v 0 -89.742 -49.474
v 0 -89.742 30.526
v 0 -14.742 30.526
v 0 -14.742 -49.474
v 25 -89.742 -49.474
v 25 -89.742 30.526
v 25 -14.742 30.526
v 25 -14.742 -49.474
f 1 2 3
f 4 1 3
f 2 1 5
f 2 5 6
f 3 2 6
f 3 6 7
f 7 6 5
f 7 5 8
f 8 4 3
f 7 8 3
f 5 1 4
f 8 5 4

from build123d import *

# Parameters (mm, degrees)
F0_W     = 75
F0_H     = 80
F1_DEPTH = 25
F2_DEPTH = 25
F3_DEPTH = 25


with BuildPart() as f1:
    # F0 (on Right) → F1 (new body)
    with BuildSketch(Plane.YZ):
        with Locations((-52.241983, -9.474061)):
            Rectangle(F0_W, F0_H)
    extrude(amount=F1_DEPTH)

    # F0 (on Right) → F2 (join)
    with BuildSketch(Plane.YZ):
        with Locations((-52.241983, -9.474061)):
            Rectangle(F0_W, F0_H)
    extrude(amount=F2_DEPTH)

    # F0 (on Right) → F3 (join)
    with BuildSketch(Plane.YZ):
        with Locations((-52.241983, -9.474061)):
            Rectangle(F0_W, F0_H)
    extrude(amount=F3_DEPTH)


solid = f1.part
